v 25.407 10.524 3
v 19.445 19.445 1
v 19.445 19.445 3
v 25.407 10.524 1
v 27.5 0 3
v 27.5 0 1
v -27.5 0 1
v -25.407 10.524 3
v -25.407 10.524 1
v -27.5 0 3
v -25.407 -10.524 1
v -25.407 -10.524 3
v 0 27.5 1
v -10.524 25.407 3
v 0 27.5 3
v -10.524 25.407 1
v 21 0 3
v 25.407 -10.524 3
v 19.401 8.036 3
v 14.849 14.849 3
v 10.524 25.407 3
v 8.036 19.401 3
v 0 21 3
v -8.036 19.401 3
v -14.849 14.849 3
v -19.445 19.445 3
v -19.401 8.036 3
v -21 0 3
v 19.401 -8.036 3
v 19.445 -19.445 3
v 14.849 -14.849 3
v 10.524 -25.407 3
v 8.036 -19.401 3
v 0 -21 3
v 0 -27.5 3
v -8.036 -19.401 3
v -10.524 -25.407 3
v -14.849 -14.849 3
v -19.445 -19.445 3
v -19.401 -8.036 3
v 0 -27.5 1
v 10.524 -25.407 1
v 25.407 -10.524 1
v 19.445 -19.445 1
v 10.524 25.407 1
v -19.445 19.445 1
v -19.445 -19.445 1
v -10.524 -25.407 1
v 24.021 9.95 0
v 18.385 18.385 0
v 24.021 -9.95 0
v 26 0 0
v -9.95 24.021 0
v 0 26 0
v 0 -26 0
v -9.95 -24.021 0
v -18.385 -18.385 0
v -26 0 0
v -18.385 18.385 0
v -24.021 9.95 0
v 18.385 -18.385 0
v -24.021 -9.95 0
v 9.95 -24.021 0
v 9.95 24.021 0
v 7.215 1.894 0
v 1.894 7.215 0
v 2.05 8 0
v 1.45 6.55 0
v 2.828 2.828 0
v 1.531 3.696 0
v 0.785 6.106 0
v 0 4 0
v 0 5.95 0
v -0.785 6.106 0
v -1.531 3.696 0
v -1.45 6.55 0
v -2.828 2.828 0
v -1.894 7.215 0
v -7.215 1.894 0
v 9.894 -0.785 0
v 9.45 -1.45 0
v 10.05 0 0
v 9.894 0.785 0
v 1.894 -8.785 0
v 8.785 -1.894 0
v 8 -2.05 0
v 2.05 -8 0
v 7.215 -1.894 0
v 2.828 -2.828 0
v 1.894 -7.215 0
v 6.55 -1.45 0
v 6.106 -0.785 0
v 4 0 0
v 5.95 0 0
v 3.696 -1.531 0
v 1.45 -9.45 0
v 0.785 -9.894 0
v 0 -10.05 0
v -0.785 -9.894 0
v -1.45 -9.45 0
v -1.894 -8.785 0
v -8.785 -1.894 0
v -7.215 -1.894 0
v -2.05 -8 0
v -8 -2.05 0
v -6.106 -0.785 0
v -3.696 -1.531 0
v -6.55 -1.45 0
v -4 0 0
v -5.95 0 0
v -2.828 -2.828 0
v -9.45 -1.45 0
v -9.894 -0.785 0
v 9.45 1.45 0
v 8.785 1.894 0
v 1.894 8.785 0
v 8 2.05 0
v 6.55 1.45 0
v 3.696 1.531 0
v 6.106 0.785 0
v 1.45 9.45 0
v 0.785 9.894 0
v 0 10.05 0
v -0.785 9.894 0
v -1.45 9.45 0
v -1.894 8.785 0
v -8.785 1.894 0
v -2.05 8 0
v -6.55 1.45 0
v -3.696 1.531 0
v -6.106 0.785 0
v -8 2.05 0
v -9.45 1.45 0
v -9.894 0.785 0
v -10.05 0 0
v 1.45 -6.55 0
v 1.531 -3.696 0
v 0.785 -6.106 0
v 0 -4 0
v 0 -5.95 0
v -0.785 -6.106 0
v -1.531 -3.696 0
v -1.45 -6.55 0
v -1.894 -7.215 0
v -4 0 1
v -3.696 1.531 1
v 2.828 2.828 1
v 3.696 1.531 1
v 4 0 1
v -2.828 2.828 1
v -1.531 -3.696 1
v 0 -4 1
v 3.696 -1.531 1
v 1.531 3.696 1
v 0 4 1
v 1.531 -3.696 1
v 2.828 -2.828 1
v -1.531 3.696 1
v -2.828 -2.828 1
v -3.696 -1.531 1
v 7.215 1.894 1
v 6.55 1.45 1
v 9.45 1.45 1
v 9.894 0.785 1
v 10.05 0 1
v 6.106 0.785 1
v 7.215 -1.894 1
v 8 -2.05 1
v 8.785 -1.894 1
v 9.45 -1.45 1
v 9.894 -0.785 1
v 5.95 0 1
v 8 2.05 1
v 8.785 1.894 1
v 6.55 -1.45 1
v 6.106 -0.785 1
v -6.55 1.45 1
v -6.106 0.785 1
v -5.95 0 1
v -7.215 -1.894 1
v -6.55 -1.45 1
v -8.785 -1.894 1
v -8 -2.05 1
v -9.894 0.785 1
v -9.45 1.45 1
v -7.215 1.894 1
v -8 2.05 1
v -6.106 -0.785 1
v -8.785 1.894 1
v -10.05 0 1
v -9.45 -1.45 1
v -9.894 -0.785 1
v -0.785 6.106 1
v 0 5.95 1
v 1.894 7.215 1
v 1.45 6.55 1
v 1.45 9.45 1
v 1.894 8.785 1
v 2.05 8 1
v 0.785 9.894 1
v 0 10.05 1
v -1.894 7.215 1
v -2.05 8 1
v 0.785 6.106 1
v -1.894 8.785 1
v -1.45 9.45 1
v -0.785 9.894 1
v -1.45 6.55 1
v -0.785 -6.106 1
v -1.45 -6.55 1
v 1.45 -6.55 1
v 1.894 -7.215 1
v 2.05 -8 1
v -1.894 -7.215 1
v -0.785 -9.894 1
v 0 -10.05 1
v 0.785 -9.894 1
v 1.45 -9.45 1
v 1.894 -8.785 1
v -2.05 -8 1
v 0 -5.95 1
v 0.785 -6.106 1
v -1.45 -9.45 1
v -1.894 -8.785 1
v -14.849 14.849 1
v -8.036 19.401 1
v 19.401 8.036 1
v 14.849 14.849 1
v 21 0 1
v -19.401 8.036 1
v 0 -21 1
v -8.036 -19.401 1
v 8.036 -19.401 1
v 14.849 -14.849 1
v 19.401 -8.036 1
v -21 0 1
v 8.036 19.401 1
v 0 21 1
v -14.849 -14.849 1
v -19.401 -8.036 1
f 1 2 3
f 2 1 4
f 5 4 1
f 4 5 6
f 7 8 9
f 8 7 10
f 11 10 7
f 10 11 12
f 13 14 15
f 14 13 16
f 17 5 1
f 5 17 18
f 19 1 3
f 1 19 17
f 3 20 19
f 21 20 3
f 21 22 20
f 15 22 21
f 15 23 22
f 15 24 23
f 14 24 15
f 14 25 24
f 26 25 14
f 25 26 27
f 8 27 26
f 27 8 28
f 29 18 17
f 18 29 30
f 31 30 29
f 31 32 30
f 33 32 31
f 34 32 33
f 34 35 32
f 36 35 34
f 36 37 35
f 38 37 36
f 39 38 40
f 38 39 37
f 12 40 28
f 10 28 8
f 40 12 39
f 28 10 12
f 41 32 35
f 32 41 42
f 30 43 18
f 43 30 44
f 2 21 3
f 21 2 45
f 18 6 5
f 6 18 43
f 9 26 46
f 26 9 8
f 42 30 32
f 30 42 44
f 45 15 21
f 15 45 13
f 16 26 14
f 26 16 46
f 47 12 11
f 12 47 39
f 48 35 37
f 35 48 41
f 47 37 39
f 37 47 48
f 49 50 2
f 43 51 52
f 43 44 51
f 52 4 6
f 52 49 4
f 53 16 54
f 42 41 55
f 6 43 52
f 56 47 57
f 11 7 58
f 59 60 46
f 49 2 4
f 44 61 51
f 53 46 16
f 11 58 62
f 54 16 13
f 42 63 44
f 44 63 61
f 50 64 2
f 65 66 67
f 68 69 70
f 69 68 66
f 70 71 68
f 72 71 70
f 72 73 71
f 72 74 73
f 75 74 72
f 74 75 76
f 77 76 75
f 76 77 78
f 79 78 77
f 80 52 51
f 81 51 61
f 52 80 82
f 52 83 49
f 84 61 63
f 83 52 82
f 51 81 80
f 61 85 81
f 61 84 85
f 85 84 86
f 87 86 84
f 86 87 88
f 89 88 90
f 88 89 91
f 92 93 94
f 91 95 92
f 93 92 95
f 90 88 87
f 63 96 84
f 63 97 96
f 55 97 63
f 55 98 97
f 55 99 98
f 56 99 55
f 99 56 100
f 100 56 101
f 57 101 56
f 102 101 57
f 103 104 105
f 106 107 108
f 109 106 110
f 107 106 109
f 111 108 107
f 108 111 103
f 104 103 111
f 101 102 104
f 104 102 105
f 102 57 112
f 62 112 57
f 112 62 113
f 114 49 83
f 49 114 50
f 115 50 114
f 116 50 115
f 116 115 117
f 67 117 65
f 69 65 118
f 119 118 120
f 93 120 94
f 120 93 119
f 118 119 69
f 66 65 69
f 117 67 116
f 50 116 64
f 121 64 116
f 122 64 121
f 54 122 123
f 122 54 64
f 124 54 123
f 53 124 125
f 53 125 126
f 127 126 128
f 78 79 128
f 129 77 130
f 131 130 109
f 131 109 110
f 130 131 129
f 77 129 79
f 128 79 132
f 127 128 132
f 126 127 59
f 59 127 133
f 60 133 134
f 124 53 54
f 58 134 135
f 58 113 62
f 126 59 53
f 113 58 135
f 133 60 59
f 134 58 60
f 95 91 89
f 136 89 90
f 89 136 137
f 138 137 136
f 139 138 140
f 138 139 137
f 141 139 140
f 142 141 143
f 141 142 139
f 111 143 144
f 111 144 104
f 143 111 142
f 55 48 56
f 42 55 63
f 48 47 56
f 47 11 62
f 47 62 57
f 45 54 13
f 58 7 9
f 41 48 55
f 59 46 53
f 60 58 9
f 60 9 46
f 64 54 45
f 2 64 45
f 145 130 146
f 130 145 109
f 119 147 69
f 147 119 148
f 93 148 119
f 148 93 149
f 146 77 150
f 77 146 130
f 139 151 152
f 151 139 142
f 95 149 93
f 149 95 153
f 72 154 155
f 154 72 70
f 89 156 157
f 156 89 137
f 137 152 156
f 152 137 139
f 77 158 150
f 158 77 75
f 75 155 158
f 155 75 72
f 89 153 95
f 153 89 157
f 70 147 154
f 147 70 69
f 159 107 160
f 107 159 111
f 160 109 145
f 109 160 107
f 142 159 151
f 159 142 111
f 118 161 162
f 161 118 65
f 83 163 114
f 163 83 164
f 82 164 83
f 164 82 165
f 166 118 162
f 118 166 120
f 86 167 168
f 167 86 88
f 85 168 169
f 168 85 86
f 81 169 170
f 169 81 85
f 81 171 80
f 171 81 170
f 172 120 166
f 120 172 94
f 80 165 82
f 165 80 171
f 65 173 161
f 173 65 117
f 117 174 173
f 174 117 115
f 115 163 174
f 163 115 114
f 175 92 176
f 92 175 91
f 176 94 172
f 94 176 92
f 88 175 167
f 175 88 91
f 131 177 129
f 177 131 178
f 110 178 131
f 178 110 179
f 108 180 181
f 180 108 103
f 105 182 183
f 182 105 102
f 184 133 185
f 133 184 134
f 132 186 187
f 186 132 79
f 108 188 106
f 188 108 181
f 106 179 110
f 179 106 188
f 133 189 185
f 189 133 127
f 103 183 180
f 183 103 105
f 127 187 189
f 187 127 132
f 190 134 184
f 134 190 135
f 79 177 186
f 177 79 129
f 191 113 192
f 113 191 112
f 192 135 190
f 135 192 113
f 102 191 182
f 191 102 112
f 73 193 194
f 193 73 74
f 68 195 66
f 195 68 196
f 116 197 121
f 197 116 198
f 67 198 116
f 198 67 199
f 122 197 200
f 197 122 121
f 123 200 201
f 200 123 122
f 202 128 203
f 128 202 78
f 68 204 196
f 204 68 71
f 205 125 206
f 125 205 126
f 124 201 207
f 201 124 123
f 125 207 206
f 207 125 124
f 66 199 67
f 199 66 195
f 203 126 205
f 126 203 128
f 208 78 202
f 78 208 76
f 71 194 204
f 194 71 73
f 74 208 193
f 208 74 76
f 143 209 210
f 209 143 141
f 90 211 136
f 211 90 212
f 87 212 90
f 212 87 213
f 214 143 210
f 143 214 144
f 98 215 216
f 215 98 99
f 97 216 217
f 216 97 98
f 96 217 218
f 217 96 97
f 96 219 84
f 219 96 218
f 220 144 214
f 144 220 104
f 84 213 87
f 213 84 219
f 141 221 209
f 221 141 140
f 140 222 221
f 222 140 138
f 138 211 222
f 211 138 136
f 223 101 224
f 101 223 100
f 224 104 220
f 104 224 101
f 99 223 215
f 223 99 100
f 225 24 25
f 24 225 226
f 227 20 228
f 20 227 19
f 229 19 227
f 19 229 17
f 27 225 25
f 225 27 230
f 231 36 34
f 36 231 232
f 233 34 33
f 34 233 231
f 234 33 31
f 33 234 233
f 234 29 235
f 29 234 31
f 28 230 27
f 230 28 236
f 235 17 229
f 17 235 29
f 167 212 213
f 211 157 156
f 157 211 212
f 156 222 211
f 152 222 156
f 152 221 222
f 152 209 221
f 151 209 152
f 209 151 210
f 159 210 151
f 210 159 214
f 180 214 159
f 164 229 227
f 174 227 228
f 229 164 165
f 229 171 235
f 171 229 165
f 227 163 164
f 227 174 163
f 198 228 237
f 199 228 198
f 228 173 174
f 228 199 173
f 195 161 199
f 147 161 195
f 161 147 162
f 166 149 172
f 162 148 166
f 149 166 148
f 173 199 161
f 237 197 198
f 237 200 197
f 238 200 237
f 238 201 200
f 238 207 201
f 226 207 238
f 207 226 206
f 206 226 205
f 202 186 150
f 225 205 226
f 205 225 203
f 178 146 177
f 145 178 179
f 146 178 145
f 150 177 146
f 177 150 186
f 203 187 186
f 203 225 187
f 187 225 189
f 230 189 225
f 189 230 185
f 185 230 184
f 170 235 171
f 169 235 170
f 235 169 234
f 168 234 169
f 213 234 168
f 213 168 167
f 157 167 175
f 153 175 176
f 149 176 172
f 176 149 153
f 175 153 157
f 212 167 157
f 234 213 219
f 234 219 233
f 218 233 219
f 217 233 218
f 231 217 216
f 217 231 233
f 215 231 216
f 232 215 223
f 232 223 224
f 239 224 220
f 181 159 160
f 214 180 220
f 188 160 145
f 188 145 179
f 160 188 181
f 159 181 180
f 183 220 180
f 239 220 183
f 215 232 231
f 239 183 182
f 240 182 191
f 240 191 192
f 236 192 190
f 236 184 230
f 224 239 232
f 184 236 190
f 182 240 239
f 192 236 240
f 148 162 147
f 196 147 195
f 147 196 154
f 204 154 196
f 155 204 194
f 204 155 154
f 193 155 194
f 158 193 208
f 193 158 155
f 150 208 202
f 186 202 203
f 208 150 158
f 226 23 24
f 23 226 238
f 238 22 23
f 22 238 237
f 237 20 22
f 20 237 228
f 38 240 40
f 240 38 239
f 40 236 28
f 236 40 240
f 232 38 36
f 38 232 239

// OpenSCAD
outerRadius = 27.5;
innerRadius = 26.0;
innerThickness = 1.0;
outerThickness = 2.0;
holeRadius = 2.05;
holeOffset = 8;
bigHoleRadius = 4;
sliderDepth = 4;
holeFacets = 16;

difference() {
    union() {
        translate([0,0,innerThickness ])
            cylinder(r = outerRadius,
                     h = outerThickness,
                     $fn=holeFacets);
                     
        linear_extrude(height=innerThickness,
                       scale = outerRadius/innerRadius)
           circle(r = innerRadius, $fn=holeFacets);
    }
    Holes();
    translate([0,0,innerThickness])
        cylinder(r = innerRadius-5,
                 h = outerThickness,
                 $fn=holeFacets);
}


module Holes() {
    cylinder(r=bigHoleRadius,h=2*sliderDepth, center=true, $fn=holeFacets);
    translate([holeOffset,0,0])
        cylinder(r=holeRadius,h=2*sliderDepth, center=true, $fn=holeFacets);
    translate([-holeOffset,0,0])
        cylinder(r=holeRadius,h=2*sliderDepth, center=true, $fn=holeFacets);
    translate([0,holeOffset,0])
        cylinder(r=holeRadius,h=2*sliderDepth, center=true, $fn=holeFacets);
    translate([0,-holeOffset,0])
        cylinder(r=holeRadius,h=2*sliderDepth, center=true, $fn=holeFacets);
}
